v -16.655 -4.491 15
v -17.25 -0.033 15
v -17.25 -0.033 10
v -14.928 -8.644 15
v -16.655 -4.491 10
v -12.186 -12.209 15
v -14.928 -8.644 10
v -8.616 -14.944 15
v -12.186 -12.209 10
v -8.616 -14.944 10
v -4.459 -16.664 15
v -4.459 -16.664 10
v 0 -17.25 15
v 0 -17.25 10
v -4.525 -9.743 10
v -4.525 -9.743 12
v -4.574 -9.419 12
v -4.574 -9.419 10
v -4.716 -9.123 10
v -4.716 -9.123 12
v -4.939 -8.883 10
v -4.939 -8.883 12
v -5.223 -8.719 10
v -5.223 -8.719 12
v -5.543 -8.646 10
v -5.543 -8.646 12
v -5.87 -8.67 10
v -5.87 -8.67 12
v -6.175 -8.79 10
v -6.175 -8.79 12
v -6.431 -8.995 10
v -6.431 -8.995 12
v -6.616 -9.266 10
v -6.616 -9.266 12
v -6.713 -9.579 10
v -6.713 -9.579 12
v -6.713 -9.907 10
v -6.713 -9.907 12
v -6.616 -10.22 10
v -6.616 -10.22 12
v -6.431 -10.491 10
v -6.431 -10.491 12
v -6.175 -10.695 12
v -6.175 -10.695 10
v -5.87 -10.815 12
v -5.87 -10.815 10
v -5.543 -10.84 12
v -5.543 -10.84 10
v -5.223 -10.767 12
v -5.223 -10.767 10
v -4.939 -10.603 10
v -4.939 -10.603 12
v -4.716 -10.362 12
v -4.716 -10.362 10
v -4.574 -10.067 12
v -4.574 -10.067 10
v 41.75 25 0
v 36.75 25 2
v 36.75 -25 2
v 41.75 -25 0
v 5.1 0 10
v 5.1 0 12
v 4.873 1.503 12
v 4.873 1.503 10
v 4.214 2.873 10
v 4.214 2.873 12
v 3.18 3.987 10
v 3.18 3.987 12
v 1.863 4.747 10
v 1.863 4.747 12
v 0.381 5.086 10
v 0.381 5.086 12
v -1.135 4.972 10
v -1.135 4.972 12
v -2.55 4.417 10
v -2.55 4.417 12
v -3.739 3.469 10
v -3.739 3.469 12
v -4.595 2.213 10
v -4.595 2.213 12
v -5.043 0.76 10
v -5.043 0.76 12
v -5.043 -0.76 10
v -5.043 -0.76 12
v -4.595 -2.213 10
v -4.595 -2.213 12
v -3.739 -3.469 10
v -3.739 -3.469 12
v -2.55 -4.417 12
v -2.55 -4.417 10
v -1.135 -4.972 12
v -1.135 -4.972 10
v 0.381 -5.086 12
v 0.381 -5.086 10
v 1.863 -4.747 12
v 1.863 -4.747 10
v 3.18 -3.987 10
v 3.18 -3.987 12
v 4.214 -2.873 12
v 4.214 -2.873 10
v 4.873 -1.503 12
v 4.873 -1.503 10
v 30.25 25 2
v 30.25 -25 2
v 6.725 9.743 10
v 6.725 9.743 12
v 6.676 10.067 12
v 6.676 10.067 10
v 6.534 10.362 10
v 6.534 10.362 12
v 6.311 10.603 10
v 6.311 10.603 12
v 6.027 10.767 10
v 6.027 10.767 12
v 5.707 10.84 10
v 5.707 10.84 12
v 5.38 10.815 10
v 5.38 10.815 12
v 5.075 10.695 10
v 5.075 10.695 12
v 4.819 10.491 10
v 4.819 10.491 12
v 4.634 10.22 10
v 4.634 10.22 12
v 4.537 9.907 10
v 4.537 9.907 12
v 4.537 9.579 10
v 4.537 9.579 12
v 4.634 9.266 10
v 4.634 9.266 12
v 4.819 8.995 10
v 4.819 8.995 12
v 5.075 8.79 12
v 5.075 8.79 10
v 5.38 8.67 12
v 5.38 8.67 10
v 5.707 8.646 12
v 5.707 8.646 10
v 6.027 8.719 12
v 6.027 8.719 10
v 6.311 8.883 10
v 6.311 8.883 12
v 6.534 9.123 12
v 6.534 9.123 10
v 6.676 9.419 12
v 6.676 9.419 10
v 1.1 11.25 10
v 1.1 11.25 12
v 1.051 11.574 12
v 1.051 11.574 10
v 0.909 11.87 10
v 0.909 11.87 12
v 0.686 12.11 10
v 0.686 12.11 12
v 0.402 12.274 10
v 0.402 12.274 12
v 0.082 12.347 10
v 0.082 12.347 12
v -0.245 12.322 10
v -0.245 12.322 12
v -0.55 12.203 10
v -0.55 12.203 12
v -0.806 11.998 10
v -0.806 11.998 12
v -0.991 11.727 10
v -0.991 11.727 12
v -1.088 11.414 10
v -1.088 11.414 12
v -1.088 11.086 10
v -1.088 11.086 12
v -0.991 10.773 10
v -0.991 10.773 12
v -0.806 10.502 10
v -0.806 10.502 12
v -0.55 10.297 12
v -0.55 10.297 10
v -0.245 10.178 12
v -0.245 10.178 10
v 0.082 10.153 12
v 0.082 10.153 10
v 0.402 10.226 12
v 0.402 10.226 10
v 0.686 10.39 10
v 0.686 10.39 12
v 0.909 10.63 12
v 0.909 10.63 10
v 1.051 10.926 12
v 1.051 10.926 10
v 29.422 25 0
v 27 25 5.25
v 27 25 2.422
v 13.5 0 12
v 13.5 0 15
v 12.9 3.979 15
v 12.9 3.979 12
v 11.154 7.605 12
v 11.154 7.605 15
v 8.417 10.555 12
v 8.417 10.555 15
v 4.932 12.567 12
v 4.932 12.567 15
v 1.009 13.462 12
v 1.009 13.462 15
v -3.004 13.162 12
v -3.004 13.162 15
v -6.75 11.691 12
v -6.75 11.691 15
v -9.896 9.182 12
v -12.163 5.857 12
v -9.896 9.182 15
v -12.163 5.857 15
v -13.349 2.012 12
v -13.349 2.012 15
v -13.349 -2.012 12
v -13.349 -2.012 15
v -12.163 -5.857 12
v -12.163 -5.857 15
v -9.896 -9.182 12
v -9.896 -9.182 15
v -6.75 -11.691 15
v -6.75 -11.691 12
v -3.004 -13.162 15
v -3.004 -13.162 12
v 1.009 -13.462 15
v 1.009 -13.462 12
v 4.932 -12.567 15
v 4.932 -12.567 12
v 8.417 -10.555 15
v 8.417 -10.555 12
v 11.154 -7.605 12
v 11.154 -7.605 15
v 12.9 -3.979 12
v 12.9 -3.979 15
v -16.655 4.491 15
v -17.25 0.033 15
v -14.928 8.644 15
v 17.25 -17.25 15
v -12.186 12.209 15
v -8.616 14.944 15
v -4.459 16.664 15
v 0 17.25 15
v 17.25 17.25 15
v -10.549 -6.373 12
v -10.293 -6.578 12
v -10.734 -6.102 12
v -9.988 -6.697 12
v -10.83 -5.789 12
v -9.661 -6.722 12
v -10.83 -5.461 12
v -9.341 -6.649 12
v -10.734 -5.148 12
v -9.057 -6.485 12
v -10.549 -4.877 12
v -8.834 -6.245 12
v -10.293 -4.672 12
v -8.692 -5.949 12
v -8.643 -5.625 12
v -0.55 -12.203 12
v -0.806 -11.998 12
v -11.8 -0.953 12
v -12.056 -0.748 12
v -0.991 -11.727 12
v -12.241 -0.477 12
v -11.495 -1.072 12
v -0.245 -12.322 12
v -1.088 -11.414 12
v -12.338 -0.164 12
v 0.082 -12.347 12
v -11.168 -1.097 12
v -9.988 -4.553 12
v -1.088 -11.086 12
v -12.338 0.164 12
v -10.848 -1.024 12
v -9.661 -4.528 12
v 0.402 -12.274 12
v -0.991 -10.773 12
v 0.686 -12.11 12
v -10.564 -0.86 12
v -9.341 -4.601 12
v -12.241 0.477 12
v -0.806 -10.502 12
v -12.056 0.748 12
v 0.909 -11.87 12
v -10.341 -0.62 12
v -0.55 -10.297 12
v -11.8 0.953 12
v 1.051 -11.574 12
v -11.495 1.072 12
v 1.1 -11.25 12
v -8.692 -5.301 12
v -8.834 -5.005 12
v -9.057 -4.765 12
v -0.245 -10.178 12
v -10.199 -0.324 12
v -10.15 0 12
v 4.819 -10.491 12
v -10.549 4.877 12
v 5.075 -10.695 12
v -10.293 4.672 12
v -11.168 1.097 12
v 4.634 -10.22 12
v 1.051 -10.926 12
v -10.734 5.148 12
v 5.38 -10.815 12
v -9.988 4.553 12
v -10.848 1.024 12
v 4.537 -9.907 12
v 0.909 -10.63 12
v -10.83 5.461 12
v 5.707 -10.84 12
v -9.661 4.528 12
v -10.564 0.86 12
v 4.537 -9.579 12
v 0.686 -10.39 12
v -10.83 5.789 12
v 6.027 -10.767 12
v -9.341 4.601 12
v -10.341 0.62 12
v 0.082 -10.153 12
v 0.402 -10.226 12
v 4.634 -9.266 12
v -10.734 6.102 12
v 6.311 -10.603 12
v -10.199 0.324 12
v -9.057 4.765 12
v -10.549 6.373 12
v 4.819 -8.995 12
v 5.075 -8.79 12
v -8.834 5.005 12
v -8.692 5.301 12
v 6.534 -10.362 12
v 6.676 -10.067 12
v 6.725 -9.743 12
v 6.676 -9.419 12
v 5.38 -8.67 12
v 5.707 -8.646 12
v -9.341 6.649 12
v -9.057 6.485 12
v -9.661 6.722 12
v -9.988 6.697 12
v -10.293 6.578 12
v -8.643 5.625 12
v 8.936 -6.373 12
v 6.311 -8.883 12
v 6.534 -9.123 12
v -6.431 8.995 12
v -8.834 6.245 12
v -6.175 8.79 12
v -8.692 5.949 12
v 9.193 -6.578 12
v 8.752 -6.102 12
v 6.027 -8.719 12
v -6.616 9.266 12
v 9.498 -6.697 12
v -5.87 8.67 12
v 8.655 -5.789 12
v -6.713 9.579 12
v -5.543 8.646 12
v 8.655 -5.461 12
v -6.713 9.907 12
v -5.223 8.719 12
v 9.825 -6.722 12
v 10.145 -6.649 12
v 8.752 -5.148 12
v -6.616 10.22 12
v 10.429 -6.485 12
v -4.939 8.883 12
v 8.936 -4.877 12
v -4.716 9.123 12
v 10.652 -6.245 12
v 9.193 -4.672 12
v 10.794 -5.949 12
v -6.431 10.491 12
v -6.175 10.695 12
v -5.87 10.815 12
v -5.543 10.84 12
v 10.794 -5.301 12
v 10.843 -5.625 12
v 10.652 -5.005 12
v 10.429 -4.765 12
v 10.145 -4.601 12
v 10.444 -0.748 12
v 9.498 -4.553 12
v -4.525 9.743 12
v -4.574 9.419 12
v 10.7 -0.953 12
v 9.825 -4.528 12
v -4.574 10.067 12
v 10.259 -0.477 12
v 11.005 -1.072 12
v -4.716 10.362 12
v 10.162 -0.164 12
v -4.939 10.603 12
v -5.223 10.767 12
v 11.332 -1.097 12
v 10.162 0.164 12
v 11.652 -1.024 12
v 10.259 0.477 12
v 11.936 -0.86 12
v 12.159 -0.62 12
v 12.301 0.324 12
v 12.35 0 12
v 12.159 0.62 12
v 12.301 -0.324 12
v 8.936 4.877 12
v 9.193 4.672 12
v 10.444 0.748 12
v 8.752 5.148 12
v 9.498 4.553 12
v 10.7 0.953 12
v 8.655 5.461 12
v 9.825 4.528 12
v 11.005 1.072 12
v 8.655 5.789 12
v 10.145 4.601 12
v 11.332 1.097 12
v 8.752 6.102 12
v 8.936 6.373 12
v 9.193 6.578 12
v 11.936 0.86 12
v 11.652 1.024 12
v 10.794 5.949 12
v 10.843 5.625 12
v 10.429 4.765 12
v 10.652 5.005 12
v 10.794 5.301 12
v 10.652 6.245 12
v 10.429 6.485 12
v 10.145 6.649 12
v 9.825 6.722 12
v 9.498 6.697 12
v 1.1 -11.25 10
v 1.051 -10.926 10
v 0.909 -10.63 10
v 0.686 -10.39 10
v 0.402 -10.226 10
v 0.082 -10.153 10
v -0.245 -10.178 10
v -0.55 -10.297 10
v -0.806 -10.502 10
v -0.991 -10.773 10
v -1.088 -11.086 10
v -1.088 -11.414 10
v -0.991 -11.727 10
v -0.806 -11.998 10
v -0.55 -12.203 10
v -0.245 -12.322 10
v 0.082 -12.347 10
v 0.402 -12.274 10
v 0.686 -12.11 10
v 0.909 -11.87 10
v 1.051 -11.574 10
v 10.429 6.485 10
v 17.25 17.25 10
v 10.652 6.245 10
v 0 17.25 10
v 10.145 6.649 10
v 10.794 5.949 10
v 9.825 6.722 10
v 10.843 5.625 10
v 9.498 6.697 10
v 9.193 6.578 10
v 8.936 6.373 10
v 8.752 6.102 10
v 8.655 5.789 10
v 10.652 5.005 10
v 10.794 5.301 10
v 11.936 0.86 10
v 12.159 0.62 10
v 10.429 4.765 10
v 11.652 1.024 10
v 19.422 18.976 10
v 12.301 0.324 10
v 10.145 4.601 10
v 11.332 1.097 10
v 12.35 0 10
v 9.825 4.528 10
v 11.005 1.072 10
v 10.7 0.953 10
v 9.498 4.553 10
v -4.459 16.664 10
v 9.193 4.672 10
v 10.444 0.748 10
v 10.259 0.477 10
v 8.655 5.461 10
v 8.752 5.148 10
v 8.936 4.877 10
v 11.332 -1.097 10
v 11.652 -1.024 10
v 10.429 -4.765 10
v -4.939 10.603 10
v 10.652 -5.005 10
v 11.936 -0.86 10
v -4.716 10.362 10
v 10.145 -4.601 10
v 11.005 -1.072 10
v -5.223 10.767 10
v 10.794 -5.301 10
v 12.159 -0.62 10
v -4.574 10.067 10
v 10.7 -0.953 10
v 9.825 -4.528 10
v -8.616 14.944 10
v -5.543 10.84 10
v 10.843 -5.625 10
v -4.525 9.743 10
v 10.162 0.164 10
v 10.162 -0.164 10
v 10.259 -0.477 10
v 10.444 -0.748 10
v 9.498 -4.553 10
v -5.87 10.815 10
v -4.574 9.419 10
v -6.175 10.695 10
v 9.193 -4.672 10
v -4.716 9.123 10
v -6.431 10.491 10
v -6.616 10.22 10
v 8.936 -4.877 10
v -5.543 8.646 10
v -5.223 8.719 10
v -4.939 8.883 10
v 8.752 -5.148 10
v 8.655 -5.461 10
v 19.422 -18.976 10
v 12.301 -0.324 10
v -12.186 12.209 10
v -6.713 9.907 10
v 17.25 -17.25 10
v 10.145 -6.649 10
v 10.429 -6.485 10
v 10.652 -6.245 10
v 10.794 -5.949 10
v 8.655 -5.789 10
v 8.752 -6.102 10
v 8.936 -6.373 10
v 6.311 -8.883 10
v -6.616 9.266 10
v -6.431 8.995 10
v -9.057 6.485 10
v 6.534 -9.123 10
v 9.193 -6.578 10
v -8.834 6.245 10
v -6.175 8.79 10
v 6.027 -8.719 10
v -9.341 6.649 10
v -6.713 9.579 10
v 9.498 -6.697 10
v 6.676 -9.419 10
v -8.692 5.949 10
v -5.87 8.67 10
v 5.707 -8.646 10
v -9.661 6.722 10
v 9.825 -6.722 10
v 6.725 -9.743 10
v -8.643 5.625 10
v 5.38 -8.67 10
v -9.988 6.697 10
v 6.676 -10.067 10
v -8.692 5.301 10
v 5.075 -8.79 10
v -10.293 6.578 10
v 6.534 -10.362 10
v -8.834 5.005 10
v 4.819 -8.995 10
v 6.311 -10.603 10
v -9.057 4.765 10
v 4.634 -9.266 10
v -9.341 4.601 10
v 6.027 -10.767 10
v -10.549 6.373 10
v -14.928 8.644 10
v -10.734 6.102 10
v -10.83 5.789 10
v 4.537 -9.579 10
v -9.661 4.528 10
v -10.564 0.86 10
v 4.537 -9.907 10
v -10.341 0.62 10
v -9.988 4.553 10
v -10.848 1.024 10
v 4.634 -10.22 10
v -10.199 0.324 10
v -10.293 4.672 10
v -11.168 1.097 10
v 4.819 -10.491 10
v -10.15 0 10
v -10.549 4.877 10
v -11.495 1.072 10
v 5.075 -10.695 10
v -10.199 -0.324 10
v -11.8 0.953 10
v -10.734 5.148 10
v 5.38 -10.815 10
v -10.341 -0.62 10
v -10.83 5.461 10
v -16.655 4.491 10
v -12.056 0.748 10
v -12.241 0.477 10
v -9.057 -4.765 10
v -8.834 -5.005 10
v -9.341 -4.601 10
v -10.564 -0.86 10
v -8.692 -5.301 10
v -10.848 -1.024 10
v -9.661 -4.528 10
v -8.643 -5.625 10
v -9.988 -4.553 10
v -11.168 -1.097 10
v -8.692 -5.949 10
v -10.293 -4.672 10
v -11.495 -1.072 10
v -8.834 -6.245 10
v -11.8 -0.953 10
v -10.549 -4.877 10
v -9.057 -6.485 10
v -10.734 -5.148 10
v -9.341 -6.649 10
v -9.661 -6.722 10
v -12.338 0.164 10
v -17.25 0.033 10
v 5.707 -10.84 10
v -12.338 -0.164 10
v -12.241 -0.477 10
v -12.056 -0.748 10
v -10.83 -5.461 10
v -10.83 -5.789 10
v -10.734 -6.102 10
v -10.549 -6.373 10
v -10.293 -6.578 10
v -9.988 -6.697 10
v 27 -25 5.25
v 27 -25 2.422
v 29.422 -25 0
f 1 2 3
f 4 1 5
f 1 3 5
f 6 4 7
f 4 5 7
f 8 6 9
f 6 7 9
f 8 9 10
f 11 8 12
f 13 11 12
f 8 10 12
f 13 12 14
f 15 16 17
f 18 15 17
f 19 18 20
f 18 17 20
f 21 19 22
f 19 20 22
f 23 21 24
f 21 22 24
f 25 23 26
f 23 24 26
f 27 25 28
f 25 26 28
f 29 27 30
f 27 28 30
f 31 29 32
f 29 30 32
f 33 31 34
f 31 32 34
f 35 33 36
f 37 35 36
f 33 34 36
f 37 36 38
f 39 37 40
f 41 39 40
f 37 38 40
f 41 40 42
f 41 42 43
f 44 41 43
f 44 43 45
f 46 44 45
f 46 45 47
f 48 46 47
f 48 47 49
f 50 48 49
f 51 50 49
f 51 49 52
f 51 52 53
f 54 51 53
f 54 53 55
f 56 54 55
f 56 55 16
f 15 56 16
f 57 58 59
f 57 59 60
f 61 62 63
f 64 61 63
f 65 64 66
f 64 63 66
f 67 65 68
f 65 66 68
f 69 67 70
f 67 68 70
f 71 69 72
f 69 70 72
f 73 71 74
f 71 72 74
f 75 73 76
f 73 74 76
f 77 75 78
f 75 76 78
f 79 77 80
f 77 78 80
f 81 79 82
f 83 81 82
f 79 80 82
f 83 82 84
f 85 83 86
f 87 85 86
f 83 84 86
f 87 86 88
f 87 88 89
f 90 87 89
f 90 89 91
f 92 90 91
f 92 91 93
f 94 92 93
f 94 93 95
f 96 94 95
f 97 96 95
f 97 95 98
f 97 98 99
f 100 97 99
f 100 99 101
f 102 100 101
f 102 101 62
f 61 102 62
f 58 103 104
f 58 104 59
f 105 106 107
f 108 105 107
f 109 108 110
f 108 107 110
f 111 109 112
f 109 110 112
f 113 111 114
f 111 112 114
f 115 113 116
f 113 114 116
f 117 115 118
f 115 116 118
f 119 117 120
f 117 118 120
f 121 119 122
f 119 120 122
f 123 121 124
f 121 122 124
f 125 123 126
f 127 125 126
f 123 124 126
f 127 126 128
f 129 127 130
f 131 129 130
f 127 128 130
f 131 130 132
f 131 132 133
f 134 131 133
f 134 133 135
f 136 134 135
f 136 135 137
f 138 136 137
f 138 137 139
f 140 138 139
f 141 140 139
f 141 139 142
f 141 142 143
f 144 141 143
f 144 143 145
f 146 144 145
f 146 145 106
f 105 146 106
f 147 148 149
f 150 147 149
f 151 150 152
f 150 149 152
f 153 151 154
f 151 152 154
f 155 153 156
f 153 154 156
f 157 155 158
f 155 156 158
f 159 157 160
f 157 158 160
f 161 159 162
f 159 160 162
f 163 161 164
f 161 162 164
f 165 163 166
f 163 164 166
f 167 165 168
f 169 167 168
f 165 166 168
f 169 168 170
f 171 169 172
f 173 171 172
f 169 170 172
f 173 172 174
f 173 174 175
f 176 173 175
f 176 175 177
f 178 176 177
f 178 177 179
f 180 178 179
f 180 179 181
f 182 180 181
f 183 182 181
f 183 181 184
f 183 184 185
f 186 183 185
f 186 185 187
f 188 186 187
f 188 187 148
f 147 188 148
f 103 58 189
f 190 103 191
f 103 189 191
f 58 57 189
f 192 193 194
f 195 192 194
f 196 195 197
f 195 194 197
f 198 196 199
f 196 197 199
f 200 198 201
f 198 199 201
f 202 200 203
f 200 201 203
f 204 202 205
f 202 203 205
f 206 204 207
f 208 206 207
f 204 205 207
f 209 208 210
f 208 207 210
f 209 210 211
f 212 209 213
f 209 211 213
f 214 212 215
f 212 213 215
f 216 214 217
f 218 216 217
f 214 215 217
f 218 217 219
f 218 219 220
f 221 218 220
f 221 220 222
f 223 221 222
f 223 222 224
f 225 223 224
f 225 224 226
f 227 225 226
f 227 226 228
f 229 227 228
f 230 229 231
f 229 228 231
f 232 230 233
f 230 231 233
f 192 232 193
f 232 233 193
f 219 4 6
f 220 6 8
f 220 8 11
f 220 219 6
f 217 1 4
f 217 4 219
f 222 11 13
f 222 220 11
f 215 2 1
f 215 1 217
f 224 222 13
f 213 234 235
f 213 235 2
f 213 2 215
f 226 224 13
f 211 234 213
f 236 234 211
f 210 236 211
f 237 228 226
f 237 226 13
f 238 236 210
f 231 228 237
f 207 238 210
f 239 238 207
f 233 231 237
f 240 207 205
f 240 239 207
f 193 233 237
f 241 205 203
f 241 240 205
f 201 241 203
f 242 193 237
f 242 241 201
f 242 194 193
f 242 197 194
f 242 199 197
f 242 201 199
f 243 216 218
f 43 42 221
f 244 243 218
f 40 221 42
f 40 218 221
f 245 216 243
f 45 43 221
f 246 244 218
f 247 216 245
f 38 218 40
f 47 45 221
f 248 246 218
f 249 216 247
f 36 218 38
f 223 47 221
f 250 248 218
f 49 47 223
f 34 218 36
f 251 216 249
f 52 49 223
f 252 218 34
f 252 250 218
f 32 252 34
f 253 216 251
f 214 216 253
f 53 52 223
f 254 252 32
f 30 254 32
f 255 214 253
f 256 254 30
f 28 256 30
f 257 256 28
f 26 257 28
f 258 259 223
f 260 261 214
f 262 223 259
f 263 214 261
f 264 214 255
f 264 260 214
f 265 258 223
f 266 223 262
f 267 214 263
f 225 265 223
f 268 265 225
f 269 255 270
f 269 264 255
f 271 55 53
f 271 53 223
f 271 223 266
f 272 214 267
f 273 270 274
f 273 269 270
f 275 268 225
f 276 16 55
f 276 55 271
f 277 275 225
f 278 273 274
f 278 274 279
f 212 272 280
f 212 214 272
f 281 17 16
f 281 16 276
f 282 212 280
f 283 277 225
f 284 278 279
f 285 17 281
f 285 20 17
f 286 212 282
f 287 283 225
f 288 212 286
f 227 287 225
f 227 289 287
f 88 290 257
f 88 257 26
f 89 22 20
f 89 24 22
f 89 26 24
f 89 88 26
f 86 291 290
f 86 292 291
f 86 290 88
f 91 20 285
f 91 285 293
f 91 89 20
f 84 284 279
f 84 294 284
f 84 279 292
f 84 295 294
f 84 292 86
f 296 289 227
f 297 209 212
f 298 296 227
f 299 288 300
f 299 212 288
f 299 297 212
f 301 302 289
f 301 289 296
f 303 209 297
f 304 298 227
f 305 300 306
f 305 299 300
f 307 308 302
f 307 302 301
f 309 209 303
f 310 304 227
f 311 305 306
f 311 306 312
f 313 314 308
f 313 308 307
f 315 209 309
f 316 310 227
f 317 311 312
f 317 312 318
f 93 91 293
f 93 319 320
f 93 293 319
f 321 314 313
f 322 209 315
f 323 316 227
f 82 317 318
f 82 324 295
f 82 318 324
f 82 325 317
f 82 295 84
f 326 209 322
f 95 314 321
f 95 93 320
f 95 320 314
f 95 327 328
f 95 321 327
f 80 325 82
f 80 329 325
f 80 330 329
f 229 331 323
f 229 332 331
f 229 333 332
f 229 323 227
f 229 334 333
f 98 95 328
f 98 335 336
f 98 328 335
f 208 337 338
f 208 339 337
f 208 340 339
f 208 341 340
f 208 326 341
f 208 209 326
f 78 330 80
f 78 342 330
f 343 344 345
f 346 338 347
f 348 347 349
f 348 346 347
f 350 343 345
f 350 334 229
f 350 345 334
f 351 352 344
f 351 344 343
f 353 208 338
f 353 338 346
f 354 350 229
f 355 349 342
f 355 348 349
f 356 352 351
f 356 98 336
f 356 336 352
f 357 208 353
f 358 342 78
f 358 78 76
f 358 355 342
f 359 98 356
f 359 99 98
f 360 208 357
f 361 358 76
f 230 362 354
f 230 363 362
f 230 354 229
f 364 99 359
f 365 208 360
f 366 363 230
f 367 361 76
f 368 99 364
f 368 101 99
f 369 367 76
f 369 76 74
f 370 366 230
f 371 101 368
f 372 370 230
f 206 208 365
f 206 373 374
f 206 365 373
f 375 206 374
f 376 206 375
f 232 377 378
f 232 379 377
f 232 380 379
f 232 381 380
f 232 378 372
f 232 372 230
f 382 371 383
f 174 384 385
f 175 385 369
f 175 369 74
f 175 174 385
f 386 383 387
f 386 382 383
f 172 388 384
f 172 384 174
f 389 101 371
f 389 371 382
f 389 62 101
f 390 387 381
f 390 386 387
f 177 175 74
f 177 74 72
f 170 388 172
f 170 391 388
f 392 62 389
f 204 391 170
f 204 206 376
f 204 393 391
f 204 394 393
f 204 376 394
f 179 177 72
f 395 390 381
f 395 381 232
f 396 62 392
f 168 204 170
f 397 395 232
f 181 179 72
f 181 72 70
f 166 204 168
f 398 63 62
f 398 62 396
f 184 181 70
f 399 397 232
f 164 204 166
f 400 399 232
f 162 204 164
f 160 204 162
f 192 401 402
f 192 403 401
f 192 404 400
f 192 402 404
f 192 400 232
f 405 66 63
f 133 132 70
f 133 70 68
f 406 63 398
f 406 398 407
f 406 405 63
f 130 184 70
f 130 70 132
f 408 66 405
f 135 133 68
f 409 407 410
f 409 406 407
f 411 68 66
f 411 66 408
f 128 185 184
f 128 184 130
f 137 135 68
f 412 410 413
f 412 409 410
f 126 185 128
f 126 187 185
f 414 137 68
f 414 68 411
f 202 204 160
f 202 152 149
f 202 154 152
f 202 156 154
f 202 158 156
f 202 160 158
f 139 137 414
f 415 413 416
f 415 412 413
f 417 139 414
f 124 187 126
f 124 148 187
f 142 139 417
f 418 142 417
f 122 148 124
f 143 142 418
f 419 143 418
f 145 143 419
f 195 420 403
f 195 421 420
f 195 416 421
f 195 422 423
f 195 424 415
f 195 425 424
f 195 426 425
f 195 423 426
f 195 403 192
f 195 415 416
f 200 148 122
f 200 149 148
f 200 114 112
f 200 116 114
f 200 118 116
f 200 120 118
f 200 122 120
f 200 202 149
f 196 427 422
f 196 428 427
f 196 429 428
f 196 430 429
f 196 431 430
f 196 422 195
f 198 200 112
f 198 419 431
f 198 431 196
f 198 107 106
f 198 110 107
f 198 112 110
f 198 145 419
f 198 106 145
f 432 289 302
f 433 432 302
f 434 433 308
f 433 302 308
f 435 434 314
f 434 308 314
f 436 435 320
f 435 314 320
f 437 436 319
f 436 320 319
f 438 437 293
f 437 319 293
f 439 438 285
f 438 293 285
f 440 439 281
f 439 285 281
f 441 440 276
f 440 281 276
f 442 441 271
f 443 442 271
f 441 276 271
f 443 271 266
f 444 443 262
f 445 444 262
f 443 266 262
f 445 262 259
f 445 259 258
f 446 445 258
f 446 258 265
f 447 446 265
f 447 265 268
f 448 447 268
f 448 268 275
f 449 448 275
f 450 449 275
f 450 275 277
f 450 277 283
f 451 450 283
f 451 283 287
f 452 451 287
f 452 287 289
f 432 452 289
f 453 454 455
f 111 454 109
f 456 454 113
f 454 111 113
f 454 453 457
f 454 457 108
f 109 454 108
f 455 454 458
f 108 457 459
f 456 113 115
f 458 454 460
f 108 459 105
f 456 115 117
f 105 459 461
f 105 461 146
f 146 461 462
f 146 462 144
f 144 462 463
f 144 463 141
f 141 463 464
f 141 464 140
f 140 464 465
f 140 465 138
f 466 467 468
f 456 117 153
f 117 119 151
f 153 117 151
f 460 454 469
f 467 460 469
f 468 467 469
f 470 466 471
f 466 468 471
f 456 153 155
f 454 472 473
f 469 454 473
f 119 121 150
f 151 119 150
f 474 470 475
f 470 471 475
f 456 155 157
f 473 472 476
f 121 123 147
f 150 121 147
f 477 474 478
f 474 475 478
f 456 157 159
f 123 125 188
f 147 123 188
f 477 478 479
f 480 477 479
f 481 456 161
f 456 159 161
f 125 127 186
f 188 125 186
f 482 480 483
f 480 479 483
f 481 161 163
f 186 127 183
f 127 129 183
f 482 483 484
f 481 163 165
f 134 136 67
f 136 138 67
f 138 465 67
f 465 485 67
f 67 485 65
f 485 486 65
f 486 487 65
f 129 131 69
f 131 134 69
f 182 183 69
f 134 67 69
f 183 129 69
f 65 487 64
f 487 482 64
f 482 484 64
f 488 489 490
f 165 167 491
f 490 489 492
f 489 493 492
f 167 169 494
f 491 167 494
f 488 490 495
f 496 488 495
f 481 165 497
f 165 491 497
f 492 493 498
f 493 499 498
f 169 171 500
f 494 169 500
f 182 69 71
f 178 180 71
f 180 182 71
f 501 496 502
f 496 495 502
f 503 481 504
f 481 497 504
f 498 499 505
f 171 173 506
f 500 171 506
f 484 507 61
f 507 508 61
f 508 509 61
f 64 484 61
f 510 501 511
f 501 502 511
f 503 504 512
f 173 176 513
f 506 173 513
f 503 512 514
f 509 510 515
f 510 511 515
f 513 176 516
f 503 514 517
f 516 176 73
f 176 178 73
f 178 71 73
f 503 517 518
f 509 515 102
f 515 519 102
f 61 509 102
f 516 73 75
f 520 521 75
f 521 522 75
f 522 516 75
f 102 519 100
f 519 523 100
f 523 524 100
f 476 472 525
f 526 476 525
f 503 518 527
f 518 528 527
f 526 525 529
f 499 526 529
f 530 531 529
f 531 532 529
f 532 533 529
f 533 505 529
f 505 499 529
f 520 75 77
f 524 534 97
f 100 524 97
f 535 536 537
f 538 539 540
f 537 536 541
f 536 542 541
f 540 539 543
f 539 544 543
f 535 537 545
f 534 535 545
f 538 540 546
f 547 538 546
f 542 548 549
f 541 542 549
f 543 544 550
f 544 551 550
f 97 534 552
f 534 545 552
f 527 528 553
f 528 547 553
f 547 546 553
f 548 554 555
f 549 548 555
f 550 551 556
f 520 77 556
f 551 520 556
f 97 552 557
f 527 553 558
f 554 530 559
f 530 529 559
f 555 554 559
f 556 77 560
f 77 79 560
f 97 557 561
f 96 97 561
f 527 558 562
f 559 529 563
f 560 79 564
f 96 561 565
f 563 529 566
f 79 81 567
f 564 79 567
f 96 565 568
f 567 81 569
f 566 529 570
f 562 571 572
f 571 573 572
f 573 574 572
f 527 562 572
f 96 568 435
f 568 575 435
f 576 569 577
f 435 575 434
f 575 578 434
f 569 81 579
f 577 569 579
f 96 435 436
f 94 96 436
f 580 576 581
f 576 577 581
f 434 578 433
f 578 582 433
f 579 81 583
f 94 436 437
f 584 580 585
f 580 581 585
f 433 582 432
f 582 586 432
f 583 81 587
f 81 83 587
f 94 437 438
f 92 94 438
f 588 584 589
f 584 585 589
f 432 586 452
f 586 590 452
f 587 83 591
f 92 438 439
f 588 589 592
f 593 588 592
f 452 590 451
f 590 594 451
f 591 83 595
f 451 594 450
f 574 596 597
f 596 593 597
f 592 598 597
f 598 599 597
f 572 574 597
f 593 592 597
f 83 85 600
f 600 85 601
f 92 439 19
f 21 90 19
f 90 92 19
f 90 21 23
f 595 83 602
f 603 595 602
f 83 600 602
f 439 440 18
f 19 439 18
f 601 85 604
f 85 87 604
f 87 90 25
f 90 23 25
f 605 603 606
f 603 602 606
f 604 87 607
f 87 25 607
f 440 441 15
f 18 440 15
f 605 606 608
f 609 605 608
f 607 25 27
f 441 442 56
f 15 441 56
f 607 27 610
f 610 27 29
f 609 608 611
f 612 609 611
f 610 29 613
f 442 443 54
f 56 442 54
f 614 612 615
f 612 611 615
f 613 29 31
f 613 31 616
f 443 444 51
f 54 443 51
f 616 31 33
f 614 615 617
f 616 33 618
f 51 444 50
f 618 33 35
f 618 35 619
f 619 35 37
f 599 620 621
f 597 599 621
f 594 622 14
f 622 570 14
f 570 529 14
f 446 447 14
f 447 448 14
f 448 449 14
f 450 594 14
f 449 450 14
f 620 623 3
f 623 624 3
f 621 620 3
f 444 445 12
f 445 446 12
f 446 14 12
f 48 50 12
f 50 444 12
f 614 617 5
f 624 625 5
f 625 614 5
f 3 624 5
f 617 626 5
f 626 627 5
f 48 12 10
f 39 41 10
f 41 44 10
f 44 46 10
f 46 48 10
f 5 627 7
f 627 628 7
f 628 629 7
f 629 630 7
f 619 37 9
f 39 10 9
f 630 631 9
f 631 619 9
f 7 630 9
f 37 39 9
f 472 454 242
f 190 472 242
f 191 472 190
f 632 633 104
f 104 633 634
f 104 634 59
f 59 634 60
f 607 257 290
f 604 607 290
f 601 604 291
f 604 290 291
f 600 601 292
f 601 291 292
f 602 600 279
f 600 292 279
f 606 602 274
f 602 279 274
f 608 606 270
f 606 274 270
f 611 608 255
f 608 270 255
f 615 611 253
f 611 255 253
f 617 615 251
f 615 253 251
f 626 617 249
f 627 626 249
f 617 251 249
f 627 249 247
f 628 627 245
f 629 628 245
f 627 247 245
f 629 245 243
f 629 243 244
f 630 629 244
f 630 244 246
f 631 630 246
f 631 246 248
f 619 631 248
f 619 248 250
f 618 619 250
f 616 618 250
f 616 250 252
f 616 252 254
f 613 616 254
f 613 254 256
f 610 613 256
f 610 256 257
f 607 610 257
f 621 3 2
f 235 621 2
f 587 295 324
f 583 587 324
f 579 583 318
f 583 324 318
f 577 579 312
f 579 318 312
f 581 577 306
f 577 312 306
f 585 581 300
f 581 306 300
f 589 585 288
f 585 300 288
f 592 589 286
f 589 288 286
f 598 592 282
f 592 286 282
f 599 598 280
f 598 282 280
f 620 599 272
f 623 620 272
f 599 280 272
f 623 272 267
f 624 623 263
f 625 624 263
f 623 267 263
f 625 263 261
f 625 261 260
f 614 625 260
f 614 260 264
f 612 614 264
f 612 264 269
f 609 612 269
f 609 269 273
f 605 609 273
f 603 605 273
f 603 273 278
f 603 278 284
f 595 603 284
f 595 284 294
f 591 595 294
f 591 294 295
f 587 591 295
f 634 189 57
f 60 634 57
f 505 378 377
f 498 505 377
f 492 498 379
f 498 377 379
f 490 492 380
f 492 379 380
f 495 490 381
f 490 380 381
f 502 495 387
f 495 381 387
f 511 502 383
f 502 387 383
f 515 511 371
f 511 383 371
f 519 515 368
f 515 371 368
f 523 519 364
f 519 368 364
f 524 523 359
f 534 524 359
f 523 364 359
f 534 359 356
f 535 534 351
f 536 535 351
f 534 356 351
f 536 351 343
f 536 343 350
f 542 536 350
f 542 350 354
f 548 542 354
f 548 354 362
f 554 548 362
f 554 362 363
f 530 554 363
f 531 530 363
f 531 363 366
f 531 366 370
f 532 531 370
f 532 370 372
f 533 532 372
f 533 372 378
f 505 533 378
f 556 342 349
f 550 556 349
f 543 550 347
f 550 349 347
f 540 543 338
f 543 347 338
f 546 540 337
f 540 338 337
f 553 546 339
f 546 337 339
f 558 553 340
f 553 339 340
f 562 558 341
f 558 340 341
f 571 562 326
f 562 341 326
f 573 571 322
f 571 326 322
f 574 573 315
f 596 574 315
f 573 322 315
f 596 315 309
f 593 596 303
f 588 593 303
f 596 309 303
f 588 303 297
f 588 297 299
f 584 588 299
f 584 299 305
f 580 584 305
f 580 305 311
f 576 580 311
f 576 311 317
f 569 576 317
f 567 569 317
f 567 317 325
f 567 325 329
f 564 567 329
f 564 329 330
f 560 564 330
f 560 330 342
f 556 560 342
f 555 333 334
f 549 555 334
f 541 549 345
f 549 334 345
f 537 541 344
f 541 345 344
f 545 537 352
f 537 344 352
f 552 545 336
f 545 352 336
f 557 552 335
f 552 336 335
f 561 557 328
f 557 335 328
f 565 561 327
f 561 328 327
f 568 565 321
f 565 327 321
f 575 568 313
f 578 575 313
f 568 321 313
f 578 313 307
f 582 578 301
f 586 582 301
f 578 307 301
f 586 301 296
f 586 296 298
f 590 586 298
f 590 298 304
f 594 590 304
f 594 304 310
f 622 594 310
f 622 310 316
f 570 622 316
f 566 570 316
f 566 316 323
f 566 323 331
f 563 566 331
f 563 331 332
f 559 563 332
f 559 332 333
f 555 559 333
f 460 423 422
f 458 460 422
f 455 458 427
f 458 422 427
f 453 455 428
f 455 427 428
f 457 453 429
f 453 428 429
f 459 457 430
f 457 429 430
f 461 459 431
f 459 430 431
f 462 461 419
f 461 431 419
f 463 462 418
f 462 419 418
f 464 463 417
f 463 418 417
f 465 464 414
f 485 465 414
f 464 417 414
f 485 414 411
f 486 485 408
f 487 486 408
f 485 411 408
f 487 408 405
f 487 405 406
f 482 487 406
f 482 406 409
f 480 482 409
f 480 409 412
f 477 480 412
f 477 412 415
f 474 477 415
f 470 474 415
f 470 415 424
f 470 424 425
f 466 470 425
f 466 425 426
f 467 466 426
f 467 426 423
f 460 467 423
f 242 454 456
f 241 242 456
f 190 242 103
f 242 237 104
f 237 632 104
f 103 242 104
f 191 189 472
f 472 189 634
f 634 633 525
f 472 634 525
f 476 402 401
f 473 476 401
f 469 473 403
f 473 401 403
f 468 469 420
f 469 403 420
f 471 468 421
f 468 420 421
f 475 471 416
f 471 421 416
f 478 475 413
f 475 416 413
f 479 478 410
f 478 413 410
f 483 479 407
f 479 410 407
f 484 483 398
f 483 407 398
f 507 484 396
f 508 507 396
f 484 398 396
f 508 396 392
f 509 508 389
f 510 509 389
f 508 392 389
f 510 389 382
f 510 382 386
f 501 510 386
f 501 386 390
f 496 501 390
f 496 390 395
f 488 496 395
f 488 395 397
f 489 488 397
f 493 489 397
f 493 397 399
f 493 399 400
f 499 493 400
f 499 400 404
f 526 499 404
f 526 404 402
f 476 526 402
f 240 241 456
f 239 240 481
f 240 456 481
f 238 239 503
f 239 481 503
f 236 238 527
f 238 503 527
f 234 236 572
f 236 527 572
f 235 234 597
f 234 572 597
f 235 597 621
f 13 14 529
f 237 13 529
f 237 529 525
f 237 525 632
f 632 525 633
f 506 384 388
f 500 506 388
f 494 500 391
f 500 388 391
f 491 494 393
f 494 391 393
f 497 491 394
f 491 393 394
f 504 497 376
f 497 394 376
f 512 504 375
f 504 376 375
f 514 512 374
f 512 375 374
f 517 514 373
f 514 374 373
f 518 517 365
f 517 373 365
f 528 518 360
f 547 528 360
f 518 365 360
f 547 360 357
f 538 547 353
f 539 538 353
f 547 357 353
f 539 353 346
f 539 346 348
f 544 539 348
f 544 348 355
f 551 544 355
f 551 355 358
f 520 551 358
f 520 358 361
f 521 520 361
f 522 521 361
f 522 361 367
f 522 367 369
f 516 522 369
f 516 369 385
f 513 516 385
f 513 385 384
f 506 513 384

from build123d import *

# Parameters (mm, degrees)
PAD001_DEPTH    = 30
PAD_DEPTH       = 15
SKETCH001_R     = 13.5
POCKET_DEPTH    = 3
SKETCH003_R     = 5.1
SKETCH003_R_2   = 1.1
POCKET001_DEPTH = 5


with BuildPart() as profile_pad:
    # Sketch002 → Pad001 (new body, symmetric)
    with BuildSketch(Plane.XZ):
        Polygon((19.421573, 10), (-17.25, 10), (-17.25, 15), (17.25, 15), (30.25, 2), (36.75, 2), (41.75, 0), (29.421573, 0), align=None)
    extrude(amount=PAD001_DEPTH, both=True)


with BuildPart() as holes:
    # Sketch → Pad (new body)
    with BuildSketch(Plane.XY):
        with BuildLine():
            ThreePointArc((0, 17.25), (-17.250031, 0), (0, -17.25))
            Line((0, -17.25), (17.25, -17.25))
            Line((17.25, -17.25), (27, -25))
            Line((27, -25), (47, -25))
            Line((47, -25), (47, 25))
            Line((47, 25), (27, 25))
            Line((17.25, 17.25), (27, 25))
            Line((17.25, 17.25), (0, 17.25))
        make_face()
    extrude(amount=PAD_DEPTH)

    # Common: intersect Profile Pad
    add(profile_pad.part, mode=Mode.INTERSECT)

    # Sketch001 → Pocket (cut)
    with BuildSketch(Plane.XY.offset(15)):
        Circle(SKETCH001_R)
    extrude(amount=-POCKET_DEPTH, mode=Mode.SUBTRACT)

    # Sketch003 → Pocket001 (cut)
    with BuildSketch(Plane.XY.offset(12)):
        Circle(SKETCH003_R)
        with Locations((-11.25, 0)):
            Circle(SKETCH003_R_2)
        with Locations((0, 11.25)):
            Circle(SKETCH003_R_2)
        with Locations((11.25, 0)):
            Circle(SKETCH003_R_2)
        with Locations((0, -11.25)):
            Circle(SKETCH003_R_2)
        with Locations((-5.625, 9.742786)):
            Circle(SKETCH003_R_2)
        with Locations((-9.742786, 5.625)):
            Circle(SKETCH003_R_2)
        with Locations((-9.742786, -5.625)):
            Circle(SKETCH003_R_2)
        with Locations((-5.625, -9.742786)):
            Circle(SKETCH003_R_2)
        with Locations((5.625, -9.742786)):
            Circle(SKETCH003_R_2)
        with Locations((9.742786, -5.625)):
            Circle(SKETCH003_R_2)
        with Locations((5.625, 9.742786)):
            Circle(SKETCH003_R_2)
        with Locations((9.742786, 5.625)):
            Circle(SKETCH003_R_2)
    extrude(amount=-POCKET001_DEPTH, mode=Mode.SUBTRACT)


solid = holes.part
